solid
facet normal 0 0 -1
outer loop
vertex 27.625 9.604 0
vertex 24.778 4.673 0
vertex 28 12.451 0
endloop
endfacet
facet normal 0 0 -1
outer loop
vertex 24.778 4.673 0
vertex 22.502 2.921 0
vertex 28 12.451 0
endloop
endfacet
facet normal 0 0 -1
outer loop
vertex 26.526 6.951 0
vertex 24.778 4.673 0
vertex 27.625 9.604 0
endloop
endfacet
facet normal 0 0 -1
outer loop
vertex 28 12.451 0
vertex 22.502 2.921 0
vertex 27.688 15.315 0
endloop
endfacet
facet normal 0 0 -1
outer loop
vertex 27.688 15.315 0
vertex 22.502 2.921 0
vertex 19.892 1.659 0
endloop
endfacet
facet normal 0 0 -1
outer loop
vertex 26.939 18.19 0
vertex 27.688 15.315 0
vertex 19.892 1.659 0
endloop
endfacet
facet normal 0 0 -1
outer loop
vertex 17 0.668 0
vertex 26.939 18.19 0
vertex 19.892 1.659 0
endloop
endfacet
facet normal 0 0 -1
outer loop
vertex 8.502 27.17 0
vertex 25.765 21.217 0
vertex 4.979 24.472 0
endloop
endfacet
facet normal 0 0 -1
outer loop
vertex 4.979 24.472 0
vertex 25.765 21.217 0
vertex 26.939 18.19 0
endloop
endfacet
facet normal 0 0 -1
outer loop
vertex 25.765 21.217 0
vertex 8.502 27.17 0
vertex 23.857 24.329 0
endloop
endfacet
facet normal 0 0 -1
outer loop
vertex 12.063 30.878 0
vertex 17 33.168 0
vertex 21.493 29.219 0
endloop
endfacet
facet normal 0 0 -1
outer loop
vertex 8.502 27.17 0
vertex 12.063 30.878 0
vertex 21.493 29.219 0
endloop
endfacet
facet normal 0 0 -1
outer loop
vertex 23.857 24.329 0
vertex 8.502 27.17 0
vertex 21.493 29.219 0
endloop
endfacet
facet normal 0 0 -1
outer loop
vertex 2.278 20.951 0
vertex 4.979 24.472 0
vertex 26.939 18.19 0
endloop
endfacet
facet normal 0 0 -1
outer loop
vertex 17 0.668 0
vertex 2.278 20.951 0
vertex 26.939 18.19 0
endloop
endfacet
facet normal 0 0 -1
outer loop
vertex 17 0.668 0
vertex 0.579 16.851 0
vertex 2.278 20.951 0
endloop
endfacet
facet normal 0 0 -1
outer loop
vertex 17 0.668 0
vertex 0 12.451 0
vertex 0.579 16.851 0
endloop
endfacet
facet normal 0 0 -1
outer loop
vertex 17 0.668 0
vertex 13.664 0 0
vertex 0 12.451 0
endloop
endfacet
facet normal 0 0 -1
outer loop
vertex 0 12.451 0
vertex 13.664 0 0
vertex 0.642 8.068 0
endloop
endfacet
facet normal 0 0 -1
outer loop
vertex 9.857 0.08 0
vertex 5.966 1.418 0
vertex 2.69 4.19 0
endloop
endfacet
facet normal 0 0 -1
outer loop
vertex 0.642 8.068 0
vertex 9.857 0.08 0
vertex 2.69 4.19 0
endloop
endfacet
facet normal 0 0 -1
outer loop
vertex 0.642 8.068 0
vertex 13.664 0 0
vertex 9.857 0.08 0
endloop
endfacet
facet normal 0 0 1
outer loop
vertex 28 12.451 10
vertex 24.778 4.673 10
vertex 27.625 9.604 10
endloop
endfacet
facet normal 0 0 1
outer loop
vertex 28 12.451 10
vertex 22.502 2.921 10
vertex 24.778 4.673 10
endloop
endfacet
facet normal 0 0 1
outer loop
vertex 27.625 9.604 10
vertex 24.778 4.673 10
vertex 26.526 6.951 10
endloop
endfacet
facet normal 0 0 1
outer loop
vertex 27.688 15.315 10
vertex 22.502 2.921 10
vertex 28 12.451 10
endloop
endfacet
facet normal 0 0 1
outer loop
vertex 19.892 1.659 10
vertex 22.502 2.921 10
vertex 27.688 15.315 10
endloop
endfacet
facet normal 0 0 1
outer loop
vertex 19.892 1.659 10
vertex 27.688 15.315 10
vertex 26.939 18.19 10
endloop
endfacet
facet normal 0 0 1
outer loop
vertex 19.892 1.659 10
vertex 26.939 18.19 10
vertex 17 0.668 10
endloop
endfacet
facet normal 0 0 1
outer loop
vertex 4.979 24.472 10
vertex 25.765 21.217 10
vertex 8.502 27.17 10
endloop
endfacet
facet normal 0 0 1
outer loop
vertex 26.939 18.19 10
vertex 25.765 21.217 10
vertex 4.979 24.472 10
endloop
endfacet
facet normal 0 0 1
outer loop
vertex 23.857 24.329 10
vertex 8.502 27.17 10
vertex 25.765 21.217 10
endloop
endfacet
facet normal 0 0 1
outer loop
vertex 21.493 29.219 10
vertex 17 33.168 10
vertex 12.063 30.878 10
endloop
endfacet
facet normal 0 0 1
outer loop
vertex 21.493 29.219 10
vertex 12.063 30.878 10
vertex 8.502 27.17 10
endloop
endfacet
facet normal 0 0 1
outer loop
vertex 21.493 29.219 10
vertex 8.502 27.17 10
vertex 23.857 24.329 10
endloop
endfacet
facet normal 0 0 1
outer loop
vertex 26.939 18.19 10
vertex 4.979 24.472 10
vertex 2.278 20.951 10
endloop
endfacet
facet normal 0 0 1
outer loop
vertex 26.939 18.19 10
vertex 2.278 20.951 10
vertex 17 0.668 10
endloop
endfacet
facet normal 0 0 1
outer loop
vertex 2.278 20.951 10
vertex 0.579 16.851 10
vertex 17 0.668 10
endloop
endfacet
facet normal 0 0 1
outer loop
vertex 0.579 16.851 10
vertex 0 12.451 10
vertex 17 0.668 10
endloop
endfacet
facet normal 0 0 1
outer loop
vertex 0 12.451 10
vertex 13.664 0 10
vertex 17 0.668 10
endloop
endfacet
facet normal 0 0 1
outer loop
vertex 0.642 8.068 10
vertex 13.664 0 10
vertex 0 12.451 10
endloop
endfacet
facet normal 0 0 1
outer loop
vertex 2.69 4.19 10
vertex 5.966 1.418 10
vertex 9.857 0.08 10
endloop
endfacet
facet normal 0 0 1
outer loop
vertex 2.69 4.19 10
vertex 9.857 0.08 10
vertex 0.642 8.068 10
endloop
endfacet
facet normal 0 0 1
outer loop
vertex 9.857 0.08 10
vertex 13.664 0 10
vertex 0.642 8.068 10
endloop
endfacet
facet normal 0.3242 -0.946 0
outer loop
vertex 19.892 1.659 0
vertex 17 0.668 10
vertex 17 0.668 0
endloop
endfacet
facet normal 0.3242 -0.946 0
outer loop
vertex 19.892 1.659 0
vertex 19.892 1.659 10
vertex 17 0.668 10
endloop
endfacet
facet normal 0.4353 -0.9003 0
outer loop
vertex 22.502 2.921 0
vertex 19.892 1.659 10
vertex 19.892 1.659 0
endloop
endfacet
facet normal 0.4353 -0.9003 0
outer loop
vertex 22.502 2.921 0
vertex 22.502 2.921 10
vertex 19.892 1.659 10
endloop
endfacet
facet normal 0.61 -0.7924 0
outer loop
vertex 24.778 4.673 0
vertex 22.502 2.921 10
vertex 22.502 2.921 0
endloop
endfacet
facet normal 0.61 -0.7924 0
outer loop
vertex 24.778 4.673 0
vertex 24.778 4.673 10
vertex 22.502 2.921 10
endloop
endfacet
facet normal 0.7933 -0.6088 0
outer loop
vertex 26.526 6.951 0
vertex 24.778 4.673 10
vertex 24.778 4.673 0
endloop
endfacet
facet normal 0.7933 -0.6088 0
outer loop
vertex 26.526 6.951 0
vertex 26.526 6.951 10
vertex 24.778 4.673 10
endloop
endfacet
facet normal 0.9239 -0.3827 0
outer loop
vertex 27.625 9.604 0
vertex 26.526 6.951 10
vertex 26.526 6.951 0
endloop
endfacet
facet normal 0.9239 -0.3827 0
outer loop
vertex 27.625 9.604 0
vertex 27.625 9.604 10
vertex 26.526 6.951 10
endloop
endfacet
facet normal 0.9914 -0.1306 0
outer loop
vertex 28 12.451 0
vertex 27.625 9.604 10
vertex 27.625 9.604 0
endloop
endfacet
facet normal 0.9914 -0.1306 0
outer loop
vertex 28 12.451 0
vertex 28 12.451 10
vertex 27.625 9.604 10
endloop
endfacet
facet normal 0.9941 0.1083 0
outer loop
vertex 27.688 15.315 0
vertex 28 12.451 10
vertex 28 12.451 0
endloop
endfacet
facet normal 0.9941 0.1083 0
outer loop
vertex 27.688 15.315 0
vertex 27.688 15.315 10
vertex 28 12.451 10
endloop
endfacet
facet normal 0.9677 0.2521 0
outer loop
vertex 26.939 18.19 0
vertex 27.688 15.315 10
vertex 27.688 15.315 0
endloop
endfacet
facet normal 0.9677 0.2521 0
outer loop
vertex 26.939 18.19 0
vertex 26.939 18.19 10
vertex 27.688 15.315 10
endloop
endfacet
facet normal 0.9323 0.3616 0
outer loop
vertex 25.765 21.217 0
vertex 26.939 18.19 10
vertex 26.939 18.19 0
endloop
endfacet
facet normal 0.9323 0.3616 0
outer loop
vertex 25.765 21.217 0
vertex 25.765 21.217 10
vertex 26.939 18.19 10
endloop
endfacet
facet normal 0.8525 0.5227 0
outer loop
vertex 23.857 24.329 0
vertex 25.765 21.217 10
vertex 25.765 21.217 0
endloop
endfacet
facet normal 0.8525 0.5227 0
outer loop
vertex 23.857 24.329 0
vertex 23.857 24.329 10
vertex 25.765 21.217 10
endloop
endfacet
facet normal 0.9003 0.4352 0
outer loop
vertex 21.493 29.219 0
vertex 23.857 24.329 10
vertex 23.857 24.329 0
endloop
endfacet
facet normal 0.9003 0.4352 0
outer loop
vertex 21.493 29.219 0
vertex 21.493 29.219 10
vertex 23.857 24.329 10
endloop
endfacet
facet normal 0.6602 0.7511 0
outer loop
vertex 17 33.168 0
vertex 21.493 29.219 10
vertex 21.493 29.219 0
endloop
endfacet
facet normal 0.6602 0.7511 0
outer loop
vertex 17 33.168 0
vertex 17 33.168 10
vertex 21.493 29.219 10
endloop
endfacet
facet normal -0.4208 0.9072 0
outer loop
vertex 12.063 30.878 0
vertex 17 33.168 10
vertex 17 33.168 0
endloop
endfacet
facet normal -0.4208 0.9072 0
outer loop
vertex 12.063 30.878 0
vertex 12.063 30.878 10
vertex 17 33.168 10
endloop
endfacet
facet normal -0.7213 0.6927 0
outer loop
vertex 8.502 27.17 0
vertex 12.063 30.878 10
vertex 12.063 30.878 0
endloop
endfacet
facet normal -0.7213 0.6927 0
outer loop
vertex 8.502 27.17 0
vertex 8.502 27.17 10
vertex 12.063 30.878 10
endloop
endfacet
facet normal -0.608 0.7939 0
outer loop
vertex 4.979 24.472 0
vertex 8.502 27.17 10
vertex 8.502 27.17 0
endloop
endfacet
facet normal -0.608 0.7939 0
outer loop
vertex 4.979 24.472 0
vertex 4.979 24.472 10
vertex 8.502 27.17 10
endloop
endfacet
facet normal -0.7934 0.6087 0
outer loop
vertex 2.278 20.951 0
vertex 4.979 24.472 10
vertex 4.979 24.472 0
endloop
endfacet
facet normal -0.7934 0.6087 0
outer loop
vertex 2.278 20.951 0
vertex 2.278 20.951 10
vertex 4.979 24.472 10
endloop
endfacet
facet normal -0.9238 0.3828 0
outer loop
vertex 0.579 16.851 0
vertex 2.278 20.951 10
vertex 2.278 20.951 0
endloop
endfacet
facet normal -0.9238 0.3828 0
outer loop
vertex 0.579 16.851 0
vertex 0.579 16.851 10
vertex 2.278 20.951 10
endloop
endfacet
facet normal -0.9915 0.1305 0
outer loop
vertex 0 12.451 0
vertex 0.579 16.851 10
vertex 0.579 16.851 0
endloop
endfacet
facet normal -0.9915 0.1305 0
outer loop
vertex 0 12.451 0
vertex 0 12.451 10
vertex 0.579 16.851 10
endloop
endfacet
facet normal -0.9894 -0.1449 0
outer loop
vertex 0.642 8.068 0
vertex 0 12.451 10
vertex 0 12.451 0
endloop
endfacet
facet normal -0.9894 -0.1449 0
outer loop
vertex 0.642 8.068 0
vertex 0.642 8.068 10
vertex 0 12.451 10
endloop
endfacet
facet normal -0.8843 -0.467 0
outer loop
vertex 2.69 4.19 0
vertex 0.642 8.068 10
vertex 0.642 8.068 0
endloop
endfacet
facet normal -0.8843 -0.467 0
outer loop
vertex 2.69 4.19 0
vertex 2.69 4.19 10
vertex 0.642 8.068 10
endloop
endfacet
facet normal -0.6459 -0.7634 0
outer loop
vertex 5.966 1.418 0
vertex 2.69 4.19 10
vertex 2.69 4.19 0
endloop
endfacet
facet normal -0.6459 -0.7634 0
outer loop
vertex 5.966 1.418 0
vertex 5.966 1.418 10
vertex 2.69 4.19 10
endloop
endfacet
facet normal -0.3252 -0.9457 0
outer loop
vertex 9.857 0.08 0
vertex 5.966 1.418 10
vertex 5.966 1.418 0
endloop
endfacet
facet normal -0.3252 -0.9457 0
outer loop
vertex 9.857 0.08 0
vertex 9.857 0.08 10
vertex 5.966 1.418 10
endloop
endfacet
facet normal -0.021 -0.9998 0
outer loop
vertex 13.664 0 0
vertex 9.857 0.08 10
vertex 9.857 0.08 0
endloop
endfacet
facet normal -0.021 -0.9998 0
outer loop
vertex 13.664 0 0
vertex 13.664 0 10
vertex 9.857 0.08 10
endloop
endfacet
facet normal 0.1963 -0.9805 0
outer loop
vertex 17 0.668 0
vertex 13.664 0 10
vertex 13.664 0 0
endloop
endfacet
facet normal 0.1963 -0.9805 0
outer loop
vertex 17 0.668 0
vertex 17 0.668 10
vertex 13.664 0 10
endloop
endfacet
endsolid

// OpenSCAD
$fn = 32;

// ----------------------------------------------------------------------
// Cam disc: base radius 11.0 mm, lift 6.0 mm, 24 profile points
// ----------------------------------------------------------------------

// --- parameters (mm) ---
profile_height = 10;      // extrusion height
profile_points = 24;      // points of the closed outline

profile = [[28, 12.451], [27.688, 15.315], [26.939, 18.19], [25.765, 21.217], [23.857, 24.329], [21.493, 29.219], [17, 33.168], [12.063, 30.878], [8.502, 27.17], [4.979, 24.472], [2.278, 20.951], [0.579, 16.851], [0, 12.451], [0.642, 8.068], [2.69, 4.19], [5.966, 1.418], [9.857, 0.08], [13.664, 0], [17, 0.668], [19.892, 1.659], [22.502, 2.921], [24.778, 4.673], [26.526, 6.951], [27.625, 9.604]];  // single closed polygon, 24 points, counter clockwise

// --- the one profile operation ---
linear_extrude(height = profile_height) polygon(points = profile);
